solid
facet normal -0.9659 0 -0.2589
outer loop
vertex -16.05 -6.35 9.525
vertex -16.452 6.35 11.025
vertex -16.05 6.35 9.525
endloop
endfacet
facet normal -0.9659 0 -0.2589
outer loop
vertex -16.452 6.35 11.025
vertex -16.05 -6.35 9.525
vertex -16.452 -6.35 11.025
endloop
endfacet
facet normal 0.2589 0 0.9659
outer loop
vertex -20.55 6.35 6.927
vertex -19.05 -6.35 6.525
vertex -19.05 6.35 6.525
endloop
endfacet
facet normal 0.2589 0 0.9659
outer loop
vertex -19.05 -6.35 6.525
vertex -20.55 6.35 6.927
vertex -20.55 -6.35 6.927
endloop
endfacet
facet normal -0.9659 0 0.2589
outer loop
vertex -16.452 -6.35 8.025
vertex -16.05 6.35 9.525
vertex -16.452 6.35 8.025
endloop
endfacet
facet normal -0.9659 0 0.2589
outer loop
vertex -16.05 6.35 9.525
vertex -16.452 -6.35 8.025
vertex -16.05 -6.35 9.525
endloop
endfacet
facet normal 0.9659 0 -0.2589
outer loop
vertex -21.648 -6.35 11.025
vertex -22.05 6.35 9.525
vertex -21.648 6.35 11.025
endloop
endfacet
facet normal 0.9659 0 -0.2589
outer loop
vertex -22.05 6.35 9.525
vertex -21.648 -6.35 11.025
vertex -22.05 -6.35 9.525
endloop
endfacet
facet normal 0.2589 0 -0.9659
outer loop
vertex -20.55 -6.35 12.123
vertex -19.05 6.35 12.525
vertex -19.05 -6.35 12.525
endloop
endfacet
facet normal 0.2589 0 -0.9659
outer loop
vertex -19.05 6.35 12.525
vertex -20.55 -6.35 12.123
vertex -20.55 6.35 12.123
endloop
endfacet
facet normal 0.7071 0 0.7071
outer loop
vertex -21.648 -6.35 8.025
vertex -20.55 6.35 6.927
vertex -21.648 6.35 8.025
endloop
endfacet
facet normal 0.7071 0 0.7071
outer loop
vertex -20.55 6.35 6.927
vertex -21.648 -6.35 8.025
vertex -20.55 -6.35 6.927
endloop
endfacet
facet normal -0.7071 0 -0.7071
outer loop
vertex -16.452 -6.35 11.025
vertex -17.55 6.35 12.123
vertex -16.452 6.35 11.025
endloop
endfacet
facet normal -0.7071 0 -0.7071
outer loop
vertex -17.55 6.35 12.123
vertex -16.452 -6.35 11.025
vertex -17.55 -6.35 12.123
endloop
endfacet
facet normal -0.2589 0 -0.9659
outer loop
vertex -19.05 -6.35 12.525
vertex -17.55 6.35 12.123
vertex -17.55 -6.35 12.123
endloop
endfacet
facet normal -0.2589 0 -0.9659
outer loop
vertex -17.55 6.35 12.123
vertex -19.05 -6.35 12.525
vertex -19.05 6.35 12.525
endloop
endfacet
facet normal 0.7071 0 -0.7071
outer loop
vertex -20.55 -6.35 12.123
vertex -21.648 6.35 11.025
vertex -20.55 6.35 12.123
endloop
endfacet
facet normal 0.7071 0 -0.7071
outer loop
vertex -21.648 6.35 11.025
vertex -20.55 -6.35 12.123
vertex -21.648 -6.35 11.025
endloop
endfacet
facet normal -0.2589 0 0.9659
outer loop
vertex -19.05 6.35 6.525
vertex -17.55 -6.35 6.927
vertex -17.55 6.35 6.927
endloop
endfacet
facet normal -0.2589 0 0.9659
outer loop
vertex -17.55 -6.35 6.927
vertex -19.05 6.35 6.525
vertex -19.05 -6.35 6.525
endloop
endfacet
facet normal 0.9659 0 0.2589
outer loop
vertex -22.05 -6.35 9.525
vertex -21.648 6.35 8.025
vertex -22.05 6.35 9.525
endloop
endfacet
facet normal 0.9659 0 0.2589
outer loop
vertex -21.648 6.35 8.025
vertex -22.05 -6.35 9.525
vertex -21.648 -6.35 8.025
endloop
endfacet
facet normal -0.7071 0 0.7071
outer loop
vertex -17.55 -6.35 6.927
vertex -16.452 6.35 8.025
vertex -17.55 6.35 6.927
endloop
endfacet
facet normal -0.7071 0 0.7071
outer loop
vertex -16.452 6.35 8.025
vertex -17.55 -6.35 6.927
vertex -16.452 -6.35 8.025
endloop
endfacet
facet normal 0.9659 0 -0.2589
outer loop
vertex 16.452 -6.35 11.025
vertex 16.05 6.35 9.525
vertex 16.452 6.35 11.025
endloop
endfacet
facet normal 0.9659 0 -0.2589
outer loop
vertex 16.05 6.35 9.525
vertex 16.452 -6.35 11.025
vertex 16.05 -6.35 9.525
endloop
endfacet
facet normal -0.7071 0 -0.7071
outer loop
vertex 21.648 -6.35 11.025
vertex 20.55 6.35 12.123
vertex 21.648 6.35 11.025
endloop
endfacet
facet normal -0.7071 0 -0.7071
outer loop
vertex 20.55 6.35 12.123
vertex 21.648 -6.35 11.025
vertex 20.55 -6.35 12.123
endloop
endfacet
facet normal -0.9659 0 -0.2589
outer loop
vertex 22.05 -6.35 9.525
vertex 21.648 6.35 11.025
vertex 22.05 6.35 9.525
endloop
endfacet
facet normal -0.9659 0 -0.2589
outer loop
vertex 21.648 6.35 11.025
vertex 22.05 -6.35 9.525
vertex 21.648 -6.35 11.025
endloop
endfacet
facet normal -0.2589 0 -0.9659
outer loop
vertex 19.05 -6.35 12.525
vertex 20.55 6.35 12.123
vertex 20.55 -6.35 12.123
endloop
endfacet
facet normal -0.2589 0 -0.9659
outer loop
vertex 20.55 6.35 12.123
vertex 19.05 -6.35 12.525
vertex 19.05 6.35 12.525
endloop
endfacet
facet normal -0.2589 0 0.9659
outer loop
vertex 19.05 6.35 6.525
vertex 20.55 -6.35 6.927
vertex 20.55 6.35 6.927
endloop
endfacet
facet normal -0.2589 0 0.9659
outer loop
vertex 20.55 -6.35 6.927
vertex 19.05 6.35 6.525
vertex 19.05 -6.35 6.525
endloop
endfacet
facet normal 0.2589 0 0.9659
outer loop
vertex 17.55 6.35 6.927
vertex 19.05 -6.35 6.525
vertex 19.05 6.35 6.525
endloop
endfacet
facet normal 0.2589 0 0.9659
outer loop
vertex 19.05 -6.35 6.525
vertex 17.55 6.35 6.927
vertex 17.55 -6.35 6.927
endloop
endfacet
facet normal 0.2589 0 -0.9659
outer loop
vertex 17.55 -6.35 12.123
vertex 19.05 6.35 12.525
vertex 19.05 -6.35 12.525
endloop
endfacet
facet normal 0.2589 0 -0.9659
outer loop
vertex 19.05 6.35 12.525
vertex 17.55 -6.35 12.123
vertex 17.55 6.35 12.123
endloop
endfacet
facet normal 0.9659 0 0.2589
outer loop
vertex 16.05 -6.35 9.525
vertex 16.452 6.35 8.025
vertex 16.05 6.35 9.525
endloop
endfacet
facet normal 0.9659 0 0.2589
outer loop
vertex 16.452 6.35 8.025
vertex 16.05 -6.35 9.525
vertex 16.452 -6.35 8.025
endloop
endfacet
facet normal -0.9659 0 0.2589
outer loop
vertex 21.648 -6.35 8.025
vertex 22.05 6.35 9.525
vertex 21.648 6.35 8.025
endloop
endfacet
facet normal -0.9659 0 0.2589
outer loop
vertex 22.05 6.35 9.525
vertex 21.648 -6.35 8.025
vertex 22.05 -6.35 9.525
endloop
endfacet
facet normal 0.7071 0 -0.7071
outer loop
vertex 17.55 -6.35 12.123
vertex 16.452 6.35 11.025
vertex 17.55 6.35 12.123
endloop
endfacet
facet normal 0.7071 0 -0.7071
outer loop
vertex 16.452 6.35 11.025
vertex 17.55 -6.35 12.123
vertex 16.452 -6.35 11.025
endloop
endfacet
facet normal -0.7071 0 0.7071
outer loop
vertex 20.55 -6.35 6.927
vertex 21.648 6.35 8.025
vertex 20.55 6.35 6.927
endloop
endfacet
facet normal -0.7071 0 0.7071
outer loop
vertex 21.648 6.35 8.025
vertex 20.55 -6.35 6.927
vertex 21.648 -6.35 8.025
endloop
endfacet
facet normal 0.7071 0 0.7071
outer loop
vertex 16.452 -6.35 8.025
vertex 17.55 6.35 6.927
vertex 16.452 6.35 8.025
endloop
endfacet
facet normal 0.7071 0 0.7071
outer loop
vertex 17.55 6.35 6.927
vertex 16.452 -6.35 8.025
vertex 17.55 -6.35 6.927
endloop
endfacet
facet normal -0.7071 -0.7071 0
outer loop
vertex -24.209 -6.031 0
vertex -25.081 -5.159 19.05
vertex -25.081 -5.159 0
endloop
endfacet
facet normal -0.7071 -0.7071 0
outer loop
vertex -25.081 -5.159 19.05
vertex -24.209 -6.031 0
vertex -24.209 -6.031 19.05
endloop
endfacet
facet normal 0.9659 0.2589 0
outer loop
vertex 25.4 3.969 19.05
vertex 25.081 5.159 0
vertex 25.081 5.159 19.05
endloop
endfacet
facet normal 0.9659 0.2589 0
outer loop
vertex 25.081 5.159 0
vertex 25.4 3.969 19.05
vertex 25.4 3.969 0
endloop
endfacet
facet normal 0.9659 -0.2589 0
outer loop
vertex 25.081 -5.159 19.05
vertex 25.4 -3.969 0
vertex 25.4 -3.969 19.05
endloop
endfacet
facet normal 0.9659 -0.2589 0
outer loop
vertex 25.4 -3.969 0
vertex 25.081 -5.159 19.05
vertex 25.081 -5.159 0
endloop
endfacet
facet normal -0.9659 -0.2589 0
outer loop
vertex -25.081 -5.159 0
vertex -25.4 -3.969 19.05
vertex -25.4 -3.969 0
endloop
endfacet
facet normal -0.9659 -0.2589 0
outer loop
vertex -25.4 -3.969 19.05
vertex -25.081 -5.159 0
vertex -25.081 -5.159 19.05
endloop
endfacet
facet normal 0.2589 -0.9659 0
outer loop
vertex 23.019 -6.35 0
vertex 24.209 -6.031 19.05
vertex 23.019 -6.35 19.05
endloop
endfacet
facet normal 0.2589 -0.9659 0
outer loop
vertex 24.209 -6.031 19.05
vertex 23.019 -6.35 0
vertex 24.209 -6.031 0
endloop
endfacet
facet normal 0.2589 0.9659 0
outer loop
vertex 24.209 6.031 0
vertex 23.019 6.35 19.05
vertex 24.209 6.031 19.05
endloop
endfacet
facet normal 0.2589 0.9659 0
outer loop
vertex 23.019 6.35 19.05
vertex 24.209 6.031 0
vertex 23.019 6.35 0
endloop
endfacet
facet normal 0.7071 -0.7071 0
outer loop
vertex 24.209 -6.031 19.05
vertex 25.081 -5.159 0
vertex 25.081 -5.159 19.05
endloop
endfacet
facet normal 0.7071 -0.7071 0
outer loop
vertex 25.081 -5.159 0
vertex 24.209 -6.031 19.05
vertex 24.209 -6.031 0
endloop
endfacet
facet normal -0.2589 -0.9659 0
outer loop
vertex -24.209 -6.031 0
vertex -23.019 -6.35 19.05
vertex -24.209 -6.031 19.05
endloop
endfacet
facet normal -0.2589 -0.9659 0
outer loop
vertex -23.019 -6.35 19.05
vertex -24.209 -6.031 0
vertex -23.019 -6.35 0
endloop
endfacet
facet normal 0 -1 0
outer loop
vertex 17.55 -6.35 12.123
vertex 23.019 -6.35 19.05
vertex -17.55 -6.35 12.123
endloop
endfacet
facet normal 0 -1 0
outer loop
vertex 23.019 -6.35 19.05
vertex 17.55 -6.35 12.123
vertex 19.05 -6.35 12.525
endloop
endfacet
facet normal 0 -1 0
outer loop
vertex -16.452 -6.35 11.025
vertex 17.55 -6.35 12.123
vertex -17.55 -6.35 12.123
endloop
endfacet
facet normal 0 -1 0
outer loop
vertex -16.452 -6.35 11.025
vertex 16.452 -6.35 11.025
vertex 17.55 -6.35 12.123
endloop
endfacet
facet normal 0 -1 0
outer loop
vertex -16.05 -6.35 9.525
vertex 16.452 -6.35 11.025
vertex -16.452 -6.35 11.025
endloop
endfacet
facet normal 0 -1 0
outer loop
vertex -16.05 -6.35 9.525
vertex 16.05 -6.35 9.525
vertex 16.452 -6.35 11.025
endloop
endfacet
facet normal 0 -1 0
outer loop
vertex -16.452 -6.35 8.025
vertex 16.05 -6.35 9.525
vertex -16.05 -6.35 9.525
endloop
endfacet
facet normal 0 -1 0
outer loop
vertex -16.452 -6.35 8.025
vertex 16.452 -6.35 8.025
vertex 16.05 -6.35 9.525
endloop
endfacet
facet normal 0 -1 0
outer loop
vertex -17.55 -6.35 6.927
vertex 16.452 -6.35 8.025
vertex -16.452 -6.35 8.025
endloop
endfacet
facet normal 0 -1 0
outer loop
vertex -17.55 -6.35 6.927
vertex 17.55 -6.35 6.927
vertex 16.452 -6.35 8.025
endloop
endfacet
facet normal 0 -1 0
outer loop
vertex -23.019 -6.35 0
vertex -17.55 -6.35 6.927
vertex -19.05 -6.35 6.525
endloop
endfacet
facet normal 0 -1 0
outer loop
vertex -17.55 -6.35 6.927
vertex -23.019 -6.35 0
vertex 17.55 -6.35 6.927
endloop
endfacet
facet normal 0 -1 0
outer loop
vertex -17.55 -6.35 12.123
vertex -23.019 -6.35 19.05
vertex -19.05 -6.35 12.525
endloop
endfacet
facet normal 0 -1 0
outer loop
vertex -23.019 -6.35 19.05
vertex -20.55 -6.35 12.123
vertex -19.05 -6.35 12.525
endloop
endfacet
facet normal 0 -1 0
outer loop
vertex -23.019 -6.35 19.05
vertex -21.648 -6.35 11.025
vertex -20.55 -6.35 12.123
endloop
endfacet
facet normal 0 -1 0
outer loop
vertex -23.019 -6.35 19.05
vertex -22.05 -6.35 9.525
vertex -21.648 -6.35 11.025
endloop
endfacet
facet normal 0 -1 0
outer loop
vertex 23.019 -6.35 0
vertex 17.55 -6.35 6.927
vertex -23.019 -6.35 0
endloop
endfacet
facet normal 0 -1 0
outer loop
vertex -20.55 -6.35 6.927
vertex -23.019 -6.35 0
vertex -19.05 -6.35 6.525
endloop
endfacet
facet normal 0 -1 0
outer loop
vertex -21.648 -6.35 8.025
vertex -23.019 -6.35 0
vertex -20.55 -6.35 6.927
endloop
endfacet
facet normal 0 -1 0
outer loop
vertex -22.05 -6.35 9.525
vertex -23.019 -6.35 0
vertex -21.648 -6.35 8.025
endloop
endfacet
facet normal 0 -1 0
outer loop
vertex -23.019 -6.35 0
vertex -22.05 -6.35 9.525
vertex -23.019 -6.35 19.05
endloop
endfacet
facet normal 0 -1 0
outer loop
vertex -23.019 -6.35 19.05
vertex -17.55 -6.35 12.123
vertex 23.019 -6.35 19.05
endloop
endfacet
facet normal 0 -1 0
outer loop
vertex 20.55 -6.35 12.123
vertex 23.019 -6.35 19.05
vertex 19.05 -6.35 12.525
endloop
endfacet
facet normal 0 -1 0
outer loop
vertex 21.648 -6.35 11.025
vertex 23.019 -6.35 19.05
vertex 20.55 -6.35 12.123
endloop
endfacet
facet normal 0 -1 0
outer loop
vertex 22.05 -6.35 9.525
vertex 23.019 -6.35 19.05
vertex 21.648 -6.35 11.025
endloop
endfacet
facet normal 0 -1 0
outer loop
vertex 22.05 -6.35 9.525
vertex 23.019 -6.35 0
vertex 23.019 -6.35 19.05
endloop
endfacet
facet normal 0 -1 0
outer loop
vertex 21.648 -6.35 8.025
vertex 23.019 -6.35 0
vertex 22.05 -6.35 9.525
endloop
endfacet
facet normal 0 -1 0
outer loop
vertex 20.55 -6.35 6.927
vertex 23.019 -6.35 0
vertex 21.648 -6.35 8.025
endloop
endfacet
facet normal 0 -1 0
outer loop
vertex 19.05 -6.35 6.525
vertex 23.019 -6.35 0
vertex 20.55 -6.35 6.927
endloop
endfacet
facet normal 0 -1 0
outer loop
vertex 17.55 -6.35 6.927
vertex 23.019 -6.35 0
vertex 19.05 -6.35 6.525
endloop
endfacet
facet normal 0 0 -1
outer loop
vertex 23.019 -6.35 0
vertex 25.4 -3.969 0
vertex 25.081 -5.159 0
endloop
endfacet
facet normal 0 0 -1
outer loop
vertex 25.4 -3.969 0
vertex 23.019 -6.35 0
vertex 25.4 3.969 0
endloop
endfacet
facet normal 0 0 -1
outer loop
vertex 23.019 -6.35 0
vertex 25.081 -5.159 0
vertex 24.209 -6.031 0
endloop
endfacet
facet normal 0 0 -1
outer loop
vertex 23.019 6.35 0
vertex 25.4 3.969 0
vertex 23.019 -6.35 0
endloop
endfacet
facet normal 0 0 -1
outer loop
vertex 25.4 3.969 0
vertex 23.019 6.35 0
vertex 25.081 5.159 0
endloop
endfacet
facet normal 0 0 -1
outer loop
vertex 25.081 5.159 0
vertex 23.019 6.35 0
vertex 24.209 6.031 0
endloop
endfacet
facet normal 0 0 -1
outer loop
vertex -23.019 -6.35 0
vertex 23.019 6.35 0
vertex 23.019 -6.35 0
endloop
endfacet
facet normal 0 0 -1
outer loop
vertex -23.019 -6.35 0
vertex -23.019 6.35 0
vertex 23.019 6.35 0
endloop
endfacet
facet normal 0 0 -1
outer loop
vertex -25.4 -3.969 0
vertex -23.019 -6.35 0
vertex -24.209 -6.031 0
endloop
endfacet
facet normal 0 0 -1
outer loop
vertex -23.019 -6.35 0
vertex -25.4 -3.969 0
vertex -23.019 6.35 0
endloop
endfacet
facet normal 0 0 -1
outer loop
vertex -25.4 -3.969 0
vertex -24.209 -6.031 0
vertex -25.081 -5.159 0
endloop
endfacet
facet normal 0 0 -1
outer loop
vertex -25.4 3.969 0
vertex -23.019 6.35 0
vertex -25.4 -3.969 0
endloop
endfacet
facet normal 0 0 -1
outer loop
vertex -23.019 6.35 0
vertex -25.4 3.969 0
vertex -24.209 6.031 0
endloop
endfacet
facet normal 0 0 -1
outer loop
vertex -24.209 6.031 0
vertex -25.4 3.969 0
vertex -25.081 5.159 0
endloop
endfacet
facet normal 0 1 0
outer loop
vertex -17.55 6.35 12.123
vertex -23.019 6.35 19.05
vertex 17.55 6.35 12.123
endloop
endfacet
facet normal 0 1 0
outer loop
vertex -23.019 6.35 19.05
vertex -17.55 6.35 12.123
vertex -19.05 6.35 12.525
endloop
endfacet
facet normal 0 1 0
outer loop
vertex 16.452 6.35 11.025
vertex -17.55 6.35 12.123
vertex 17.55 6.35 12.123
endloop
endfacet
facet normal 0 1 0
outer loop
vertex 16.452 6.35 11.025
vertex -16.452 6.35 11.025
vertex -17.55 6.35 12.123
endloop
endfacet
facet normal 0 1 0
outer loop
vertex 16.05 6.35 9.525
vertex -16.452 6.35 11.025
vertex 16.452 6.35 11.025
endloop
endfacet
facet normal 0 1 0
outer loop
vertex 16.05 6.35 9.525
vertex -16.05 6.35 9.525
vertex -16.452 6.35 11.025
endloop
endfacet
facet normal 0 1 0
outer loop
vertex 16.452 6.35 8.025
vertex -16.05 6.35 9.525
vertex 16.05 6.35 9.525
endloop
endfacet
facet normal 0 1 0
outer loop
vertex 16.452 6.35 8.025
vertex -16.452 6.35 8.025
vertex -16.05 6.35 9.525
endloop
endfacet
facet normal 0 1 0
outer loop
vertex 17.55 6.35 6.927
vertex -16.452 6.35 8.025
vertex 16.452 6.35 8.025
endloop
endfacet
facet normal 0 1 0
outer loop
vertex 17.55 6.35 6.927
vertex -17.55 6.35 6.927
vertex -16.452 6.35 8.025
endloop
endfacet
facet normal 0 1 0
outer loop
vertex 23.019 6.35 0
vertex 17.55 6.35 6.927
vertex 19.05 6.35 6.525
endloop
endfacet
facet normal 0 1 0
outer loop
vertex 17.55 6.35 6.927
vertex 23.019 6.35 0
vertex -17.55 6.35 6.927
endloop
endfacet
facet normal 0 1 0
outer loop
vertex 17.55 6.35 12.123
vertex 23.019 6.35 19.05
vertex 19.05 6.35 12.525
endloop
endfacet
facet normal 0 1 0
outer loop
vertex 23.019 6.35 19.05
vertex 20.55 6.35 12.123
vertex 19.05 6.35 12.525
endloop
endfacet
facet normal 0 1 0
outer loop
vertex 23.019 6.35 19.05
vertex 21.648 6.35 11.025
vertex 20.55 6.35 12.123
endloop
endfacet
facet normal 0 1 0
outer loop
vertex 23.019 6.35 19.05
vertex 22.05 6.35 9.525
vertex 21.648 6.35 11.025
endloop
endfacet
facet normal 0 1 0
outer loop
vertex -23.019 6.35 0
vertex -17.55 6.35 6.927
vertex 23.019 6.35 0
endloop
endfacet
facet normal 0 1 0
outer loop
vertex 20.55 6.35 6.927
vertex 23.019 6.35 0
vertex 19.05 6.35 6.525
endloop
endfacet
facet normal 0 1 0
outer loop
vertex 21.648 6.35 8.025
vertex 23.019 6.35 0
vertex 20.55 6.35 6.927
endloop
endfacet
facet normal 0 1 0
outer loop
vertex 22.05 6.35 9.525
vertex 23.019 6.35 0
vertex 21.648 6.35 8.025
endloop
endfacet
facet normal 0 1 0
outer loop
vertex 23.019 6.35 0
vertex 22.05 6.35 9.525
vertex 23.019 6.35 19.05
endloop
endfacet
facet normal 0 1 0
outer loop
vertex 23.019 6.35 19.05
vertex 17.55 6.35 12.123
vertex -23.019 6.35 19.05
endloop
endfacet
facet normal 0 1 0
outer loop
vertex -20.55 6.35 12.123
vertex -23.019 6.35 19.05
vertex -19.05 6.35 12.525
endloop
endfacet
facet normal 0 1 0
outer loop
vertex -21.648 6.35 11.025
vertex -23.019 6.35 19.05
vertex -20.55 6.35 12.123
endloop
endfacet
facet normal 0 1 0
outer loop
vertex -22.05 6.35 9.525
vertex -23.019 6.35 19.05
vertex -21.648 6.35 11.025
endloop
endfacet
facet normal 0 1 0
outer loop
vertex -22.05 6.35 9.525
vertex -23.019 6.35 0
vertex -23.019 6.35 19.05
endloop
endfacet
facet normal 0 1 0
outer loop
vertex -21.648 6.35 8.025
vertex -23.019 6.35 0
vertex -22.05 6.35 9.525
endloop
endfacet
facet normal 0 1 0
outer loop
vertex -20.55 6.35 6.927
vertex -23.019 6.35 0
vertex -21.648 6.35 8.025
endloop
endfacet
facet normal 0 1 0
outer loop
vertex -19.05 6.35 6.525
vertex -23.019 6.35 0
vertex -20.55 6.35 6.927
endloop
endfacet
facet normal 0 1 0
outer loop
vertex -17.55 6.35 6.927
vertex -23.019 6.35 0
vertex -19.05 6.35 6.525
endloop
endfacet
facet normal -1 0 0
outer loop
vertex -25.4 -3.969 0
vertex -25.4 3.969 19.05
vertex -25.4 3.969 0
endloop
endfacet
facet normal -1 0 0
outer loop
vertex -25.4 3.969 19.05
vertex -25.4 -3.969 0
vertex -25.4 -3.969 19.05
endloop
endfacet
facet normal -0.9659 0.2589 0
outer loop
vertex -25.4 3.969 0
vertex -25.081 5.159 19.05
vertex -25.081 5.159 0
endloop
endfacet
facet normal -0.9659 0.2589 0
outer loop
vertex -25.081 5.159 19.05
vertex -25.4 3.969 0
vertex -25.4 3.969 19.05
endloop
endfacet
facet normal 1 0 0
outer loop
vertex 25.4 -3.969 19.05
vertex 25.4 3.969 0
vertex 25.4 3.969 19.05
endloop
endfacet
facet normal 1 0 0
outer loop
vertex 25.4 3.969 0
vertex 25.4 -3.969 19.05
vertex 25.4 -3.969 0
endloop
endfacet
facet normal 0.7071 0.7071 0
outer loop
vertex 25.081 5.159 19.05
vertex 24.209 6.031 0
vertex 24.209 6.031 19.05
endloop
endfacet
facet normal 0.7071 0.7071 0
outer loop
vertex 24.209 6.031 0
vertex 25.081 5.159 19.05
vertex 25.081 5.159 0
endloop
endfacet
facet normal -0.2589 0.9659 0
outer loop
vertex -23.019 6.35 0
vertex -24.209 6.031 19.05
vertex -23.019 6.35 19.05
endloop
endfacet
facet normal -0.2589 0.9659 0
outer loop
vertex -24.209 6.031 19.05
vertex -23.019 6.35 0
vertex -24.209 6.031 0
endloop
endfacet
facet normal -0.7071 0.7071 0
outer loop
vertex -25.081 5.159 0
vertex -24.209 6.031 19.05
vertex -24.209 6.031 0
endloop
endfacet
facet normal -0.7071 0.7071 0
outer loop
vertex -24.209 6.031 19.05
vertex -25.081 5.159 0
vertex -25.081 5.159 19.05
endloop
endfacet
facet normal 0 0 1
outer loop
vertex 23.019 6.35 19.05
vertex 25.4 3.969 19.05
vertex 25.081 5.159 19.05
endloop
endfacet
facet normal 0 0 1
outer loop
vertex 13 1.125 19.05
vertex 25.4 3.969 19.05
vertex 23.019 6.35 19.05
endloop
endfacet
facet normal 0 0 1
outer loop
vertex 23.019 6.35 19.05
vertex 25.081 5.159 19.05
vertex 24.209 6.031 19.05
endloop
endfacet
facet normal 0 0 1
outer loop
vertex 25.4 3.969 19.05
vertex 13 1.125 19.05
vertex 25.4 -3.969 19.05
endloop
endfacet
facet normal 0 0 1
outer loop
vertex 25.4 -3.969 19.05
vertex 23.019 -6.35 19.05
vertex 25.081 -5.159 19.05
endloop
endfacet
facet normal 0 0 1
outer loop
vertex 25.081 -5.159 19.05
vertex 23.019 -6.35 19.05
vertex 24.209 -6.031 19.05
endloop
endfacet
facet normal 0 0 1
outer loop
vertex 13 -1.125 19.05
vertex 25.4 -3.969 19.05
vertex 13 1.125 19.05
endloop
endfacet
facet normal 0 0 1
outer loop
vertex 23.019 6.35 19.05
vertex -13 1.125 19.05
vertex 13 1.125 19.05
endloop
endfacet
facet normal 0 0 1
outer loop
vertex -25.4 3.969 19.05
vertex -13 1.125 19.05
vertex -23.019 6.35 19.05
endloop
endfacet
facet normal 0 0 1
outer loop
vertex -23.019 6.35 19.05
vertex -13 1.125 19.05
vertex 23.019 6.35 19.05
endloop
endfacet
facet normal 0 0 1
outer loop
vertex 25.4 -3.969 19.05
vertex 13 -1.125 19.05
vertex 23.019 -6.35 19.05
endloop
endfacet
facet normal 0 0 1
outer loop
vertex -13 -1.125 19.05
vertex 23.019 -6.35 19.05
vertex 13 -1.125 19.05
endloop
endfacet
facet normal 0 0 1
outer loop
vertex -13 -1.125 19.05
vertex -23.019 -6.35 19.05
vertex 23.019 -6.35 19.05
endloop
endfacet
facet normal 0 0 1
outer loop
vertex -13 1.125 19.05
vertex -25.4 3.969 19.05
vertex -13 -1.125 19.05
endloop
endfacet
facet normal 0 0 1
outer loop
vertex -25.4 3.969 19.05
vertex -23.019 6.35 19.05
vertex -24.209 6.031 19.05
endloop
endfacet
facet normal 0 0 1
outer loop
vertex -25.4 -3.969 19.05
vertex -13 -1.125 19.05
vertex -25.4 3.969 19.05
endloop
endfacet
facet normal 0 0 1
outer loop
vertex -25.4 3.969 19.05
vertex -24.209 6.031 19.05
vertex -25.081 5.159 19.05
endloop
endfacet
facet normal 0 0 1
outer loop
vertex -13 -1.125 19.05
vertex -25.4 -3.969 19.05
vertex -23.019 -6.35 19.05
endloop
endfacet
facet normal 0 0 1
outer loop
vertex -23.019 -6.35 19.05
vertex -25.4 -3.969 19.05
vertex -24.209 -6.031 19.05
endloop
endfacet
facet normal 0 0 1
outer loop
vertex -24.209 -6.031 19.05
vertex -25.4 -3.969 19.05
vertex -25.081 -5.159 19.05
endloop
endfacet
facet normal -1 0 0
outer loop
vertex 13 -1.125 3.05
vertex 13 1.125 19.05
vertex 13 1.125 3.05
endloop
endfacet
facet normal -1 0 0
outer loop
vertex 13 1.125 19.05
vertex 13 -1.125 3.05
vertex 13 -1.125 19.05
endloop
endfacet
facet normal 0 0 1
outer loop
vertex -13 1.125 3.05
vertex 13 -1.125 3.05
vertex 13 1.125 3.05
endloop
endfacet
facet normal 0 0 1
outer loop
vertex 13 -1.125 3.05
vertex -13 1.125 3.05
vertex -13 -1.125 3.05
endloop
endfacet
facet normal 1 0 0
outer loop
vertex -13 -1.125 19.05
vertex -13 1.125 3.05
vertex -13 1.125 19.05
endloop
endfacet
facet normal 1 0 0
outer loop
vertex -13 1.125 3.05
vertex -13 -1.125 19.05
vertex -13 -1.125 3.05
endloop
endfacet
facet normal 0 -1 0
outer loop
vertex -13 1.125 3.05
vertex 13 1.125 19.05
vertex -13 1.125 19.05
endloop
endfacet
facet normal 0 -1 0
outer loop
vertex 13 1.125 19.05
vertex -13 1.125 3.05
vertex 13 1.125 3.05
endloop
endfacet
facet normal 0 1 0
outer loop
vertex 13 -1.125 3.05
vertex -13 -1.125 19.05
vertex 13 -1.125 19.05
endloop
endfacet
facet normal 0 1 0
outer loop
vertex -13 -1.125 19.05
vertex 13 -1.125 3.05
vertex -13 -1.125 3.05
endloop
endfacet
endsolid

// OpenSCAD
// SDCardHolder-v1.0

$fn = 12;

inch = 25.4;

module rounded_square(size, corner_radius, offset=0) {
	hull() for( ym=[-1,1] ) for( xm=[-1,1] ) {
		translate([
			xm*(size[0]/2-corner_radius),
			ym*(size[1]/2-corner_radius),
		]) circle(r=corner_radius+offset);
	}	
}

module xy_rounded_cube(size, corner_radius, offset=0) {
	linear_extrude(size[2]+offset*2, center=true) rounded_square(size, corner_radius, offset=offset);
}


module sd_card_cav() {
	cube([26, 2.25, 48], center=true);
}

difference() {
	translate([0,0,3/8*inch]) xy_rounded_cube([2*inch, 1/2*inch, 3/4*inch], 3/32*inch);
	translate([0,0,3/4*inch + 8]) sd_card_cav();
	for( xi=[-0.75, 0.75] ) {
		translate([xi*inch, 0, 3/8*inch]) rotate([90,0,0]) cylinder(d=6, h=50, center=true);
	}
}
